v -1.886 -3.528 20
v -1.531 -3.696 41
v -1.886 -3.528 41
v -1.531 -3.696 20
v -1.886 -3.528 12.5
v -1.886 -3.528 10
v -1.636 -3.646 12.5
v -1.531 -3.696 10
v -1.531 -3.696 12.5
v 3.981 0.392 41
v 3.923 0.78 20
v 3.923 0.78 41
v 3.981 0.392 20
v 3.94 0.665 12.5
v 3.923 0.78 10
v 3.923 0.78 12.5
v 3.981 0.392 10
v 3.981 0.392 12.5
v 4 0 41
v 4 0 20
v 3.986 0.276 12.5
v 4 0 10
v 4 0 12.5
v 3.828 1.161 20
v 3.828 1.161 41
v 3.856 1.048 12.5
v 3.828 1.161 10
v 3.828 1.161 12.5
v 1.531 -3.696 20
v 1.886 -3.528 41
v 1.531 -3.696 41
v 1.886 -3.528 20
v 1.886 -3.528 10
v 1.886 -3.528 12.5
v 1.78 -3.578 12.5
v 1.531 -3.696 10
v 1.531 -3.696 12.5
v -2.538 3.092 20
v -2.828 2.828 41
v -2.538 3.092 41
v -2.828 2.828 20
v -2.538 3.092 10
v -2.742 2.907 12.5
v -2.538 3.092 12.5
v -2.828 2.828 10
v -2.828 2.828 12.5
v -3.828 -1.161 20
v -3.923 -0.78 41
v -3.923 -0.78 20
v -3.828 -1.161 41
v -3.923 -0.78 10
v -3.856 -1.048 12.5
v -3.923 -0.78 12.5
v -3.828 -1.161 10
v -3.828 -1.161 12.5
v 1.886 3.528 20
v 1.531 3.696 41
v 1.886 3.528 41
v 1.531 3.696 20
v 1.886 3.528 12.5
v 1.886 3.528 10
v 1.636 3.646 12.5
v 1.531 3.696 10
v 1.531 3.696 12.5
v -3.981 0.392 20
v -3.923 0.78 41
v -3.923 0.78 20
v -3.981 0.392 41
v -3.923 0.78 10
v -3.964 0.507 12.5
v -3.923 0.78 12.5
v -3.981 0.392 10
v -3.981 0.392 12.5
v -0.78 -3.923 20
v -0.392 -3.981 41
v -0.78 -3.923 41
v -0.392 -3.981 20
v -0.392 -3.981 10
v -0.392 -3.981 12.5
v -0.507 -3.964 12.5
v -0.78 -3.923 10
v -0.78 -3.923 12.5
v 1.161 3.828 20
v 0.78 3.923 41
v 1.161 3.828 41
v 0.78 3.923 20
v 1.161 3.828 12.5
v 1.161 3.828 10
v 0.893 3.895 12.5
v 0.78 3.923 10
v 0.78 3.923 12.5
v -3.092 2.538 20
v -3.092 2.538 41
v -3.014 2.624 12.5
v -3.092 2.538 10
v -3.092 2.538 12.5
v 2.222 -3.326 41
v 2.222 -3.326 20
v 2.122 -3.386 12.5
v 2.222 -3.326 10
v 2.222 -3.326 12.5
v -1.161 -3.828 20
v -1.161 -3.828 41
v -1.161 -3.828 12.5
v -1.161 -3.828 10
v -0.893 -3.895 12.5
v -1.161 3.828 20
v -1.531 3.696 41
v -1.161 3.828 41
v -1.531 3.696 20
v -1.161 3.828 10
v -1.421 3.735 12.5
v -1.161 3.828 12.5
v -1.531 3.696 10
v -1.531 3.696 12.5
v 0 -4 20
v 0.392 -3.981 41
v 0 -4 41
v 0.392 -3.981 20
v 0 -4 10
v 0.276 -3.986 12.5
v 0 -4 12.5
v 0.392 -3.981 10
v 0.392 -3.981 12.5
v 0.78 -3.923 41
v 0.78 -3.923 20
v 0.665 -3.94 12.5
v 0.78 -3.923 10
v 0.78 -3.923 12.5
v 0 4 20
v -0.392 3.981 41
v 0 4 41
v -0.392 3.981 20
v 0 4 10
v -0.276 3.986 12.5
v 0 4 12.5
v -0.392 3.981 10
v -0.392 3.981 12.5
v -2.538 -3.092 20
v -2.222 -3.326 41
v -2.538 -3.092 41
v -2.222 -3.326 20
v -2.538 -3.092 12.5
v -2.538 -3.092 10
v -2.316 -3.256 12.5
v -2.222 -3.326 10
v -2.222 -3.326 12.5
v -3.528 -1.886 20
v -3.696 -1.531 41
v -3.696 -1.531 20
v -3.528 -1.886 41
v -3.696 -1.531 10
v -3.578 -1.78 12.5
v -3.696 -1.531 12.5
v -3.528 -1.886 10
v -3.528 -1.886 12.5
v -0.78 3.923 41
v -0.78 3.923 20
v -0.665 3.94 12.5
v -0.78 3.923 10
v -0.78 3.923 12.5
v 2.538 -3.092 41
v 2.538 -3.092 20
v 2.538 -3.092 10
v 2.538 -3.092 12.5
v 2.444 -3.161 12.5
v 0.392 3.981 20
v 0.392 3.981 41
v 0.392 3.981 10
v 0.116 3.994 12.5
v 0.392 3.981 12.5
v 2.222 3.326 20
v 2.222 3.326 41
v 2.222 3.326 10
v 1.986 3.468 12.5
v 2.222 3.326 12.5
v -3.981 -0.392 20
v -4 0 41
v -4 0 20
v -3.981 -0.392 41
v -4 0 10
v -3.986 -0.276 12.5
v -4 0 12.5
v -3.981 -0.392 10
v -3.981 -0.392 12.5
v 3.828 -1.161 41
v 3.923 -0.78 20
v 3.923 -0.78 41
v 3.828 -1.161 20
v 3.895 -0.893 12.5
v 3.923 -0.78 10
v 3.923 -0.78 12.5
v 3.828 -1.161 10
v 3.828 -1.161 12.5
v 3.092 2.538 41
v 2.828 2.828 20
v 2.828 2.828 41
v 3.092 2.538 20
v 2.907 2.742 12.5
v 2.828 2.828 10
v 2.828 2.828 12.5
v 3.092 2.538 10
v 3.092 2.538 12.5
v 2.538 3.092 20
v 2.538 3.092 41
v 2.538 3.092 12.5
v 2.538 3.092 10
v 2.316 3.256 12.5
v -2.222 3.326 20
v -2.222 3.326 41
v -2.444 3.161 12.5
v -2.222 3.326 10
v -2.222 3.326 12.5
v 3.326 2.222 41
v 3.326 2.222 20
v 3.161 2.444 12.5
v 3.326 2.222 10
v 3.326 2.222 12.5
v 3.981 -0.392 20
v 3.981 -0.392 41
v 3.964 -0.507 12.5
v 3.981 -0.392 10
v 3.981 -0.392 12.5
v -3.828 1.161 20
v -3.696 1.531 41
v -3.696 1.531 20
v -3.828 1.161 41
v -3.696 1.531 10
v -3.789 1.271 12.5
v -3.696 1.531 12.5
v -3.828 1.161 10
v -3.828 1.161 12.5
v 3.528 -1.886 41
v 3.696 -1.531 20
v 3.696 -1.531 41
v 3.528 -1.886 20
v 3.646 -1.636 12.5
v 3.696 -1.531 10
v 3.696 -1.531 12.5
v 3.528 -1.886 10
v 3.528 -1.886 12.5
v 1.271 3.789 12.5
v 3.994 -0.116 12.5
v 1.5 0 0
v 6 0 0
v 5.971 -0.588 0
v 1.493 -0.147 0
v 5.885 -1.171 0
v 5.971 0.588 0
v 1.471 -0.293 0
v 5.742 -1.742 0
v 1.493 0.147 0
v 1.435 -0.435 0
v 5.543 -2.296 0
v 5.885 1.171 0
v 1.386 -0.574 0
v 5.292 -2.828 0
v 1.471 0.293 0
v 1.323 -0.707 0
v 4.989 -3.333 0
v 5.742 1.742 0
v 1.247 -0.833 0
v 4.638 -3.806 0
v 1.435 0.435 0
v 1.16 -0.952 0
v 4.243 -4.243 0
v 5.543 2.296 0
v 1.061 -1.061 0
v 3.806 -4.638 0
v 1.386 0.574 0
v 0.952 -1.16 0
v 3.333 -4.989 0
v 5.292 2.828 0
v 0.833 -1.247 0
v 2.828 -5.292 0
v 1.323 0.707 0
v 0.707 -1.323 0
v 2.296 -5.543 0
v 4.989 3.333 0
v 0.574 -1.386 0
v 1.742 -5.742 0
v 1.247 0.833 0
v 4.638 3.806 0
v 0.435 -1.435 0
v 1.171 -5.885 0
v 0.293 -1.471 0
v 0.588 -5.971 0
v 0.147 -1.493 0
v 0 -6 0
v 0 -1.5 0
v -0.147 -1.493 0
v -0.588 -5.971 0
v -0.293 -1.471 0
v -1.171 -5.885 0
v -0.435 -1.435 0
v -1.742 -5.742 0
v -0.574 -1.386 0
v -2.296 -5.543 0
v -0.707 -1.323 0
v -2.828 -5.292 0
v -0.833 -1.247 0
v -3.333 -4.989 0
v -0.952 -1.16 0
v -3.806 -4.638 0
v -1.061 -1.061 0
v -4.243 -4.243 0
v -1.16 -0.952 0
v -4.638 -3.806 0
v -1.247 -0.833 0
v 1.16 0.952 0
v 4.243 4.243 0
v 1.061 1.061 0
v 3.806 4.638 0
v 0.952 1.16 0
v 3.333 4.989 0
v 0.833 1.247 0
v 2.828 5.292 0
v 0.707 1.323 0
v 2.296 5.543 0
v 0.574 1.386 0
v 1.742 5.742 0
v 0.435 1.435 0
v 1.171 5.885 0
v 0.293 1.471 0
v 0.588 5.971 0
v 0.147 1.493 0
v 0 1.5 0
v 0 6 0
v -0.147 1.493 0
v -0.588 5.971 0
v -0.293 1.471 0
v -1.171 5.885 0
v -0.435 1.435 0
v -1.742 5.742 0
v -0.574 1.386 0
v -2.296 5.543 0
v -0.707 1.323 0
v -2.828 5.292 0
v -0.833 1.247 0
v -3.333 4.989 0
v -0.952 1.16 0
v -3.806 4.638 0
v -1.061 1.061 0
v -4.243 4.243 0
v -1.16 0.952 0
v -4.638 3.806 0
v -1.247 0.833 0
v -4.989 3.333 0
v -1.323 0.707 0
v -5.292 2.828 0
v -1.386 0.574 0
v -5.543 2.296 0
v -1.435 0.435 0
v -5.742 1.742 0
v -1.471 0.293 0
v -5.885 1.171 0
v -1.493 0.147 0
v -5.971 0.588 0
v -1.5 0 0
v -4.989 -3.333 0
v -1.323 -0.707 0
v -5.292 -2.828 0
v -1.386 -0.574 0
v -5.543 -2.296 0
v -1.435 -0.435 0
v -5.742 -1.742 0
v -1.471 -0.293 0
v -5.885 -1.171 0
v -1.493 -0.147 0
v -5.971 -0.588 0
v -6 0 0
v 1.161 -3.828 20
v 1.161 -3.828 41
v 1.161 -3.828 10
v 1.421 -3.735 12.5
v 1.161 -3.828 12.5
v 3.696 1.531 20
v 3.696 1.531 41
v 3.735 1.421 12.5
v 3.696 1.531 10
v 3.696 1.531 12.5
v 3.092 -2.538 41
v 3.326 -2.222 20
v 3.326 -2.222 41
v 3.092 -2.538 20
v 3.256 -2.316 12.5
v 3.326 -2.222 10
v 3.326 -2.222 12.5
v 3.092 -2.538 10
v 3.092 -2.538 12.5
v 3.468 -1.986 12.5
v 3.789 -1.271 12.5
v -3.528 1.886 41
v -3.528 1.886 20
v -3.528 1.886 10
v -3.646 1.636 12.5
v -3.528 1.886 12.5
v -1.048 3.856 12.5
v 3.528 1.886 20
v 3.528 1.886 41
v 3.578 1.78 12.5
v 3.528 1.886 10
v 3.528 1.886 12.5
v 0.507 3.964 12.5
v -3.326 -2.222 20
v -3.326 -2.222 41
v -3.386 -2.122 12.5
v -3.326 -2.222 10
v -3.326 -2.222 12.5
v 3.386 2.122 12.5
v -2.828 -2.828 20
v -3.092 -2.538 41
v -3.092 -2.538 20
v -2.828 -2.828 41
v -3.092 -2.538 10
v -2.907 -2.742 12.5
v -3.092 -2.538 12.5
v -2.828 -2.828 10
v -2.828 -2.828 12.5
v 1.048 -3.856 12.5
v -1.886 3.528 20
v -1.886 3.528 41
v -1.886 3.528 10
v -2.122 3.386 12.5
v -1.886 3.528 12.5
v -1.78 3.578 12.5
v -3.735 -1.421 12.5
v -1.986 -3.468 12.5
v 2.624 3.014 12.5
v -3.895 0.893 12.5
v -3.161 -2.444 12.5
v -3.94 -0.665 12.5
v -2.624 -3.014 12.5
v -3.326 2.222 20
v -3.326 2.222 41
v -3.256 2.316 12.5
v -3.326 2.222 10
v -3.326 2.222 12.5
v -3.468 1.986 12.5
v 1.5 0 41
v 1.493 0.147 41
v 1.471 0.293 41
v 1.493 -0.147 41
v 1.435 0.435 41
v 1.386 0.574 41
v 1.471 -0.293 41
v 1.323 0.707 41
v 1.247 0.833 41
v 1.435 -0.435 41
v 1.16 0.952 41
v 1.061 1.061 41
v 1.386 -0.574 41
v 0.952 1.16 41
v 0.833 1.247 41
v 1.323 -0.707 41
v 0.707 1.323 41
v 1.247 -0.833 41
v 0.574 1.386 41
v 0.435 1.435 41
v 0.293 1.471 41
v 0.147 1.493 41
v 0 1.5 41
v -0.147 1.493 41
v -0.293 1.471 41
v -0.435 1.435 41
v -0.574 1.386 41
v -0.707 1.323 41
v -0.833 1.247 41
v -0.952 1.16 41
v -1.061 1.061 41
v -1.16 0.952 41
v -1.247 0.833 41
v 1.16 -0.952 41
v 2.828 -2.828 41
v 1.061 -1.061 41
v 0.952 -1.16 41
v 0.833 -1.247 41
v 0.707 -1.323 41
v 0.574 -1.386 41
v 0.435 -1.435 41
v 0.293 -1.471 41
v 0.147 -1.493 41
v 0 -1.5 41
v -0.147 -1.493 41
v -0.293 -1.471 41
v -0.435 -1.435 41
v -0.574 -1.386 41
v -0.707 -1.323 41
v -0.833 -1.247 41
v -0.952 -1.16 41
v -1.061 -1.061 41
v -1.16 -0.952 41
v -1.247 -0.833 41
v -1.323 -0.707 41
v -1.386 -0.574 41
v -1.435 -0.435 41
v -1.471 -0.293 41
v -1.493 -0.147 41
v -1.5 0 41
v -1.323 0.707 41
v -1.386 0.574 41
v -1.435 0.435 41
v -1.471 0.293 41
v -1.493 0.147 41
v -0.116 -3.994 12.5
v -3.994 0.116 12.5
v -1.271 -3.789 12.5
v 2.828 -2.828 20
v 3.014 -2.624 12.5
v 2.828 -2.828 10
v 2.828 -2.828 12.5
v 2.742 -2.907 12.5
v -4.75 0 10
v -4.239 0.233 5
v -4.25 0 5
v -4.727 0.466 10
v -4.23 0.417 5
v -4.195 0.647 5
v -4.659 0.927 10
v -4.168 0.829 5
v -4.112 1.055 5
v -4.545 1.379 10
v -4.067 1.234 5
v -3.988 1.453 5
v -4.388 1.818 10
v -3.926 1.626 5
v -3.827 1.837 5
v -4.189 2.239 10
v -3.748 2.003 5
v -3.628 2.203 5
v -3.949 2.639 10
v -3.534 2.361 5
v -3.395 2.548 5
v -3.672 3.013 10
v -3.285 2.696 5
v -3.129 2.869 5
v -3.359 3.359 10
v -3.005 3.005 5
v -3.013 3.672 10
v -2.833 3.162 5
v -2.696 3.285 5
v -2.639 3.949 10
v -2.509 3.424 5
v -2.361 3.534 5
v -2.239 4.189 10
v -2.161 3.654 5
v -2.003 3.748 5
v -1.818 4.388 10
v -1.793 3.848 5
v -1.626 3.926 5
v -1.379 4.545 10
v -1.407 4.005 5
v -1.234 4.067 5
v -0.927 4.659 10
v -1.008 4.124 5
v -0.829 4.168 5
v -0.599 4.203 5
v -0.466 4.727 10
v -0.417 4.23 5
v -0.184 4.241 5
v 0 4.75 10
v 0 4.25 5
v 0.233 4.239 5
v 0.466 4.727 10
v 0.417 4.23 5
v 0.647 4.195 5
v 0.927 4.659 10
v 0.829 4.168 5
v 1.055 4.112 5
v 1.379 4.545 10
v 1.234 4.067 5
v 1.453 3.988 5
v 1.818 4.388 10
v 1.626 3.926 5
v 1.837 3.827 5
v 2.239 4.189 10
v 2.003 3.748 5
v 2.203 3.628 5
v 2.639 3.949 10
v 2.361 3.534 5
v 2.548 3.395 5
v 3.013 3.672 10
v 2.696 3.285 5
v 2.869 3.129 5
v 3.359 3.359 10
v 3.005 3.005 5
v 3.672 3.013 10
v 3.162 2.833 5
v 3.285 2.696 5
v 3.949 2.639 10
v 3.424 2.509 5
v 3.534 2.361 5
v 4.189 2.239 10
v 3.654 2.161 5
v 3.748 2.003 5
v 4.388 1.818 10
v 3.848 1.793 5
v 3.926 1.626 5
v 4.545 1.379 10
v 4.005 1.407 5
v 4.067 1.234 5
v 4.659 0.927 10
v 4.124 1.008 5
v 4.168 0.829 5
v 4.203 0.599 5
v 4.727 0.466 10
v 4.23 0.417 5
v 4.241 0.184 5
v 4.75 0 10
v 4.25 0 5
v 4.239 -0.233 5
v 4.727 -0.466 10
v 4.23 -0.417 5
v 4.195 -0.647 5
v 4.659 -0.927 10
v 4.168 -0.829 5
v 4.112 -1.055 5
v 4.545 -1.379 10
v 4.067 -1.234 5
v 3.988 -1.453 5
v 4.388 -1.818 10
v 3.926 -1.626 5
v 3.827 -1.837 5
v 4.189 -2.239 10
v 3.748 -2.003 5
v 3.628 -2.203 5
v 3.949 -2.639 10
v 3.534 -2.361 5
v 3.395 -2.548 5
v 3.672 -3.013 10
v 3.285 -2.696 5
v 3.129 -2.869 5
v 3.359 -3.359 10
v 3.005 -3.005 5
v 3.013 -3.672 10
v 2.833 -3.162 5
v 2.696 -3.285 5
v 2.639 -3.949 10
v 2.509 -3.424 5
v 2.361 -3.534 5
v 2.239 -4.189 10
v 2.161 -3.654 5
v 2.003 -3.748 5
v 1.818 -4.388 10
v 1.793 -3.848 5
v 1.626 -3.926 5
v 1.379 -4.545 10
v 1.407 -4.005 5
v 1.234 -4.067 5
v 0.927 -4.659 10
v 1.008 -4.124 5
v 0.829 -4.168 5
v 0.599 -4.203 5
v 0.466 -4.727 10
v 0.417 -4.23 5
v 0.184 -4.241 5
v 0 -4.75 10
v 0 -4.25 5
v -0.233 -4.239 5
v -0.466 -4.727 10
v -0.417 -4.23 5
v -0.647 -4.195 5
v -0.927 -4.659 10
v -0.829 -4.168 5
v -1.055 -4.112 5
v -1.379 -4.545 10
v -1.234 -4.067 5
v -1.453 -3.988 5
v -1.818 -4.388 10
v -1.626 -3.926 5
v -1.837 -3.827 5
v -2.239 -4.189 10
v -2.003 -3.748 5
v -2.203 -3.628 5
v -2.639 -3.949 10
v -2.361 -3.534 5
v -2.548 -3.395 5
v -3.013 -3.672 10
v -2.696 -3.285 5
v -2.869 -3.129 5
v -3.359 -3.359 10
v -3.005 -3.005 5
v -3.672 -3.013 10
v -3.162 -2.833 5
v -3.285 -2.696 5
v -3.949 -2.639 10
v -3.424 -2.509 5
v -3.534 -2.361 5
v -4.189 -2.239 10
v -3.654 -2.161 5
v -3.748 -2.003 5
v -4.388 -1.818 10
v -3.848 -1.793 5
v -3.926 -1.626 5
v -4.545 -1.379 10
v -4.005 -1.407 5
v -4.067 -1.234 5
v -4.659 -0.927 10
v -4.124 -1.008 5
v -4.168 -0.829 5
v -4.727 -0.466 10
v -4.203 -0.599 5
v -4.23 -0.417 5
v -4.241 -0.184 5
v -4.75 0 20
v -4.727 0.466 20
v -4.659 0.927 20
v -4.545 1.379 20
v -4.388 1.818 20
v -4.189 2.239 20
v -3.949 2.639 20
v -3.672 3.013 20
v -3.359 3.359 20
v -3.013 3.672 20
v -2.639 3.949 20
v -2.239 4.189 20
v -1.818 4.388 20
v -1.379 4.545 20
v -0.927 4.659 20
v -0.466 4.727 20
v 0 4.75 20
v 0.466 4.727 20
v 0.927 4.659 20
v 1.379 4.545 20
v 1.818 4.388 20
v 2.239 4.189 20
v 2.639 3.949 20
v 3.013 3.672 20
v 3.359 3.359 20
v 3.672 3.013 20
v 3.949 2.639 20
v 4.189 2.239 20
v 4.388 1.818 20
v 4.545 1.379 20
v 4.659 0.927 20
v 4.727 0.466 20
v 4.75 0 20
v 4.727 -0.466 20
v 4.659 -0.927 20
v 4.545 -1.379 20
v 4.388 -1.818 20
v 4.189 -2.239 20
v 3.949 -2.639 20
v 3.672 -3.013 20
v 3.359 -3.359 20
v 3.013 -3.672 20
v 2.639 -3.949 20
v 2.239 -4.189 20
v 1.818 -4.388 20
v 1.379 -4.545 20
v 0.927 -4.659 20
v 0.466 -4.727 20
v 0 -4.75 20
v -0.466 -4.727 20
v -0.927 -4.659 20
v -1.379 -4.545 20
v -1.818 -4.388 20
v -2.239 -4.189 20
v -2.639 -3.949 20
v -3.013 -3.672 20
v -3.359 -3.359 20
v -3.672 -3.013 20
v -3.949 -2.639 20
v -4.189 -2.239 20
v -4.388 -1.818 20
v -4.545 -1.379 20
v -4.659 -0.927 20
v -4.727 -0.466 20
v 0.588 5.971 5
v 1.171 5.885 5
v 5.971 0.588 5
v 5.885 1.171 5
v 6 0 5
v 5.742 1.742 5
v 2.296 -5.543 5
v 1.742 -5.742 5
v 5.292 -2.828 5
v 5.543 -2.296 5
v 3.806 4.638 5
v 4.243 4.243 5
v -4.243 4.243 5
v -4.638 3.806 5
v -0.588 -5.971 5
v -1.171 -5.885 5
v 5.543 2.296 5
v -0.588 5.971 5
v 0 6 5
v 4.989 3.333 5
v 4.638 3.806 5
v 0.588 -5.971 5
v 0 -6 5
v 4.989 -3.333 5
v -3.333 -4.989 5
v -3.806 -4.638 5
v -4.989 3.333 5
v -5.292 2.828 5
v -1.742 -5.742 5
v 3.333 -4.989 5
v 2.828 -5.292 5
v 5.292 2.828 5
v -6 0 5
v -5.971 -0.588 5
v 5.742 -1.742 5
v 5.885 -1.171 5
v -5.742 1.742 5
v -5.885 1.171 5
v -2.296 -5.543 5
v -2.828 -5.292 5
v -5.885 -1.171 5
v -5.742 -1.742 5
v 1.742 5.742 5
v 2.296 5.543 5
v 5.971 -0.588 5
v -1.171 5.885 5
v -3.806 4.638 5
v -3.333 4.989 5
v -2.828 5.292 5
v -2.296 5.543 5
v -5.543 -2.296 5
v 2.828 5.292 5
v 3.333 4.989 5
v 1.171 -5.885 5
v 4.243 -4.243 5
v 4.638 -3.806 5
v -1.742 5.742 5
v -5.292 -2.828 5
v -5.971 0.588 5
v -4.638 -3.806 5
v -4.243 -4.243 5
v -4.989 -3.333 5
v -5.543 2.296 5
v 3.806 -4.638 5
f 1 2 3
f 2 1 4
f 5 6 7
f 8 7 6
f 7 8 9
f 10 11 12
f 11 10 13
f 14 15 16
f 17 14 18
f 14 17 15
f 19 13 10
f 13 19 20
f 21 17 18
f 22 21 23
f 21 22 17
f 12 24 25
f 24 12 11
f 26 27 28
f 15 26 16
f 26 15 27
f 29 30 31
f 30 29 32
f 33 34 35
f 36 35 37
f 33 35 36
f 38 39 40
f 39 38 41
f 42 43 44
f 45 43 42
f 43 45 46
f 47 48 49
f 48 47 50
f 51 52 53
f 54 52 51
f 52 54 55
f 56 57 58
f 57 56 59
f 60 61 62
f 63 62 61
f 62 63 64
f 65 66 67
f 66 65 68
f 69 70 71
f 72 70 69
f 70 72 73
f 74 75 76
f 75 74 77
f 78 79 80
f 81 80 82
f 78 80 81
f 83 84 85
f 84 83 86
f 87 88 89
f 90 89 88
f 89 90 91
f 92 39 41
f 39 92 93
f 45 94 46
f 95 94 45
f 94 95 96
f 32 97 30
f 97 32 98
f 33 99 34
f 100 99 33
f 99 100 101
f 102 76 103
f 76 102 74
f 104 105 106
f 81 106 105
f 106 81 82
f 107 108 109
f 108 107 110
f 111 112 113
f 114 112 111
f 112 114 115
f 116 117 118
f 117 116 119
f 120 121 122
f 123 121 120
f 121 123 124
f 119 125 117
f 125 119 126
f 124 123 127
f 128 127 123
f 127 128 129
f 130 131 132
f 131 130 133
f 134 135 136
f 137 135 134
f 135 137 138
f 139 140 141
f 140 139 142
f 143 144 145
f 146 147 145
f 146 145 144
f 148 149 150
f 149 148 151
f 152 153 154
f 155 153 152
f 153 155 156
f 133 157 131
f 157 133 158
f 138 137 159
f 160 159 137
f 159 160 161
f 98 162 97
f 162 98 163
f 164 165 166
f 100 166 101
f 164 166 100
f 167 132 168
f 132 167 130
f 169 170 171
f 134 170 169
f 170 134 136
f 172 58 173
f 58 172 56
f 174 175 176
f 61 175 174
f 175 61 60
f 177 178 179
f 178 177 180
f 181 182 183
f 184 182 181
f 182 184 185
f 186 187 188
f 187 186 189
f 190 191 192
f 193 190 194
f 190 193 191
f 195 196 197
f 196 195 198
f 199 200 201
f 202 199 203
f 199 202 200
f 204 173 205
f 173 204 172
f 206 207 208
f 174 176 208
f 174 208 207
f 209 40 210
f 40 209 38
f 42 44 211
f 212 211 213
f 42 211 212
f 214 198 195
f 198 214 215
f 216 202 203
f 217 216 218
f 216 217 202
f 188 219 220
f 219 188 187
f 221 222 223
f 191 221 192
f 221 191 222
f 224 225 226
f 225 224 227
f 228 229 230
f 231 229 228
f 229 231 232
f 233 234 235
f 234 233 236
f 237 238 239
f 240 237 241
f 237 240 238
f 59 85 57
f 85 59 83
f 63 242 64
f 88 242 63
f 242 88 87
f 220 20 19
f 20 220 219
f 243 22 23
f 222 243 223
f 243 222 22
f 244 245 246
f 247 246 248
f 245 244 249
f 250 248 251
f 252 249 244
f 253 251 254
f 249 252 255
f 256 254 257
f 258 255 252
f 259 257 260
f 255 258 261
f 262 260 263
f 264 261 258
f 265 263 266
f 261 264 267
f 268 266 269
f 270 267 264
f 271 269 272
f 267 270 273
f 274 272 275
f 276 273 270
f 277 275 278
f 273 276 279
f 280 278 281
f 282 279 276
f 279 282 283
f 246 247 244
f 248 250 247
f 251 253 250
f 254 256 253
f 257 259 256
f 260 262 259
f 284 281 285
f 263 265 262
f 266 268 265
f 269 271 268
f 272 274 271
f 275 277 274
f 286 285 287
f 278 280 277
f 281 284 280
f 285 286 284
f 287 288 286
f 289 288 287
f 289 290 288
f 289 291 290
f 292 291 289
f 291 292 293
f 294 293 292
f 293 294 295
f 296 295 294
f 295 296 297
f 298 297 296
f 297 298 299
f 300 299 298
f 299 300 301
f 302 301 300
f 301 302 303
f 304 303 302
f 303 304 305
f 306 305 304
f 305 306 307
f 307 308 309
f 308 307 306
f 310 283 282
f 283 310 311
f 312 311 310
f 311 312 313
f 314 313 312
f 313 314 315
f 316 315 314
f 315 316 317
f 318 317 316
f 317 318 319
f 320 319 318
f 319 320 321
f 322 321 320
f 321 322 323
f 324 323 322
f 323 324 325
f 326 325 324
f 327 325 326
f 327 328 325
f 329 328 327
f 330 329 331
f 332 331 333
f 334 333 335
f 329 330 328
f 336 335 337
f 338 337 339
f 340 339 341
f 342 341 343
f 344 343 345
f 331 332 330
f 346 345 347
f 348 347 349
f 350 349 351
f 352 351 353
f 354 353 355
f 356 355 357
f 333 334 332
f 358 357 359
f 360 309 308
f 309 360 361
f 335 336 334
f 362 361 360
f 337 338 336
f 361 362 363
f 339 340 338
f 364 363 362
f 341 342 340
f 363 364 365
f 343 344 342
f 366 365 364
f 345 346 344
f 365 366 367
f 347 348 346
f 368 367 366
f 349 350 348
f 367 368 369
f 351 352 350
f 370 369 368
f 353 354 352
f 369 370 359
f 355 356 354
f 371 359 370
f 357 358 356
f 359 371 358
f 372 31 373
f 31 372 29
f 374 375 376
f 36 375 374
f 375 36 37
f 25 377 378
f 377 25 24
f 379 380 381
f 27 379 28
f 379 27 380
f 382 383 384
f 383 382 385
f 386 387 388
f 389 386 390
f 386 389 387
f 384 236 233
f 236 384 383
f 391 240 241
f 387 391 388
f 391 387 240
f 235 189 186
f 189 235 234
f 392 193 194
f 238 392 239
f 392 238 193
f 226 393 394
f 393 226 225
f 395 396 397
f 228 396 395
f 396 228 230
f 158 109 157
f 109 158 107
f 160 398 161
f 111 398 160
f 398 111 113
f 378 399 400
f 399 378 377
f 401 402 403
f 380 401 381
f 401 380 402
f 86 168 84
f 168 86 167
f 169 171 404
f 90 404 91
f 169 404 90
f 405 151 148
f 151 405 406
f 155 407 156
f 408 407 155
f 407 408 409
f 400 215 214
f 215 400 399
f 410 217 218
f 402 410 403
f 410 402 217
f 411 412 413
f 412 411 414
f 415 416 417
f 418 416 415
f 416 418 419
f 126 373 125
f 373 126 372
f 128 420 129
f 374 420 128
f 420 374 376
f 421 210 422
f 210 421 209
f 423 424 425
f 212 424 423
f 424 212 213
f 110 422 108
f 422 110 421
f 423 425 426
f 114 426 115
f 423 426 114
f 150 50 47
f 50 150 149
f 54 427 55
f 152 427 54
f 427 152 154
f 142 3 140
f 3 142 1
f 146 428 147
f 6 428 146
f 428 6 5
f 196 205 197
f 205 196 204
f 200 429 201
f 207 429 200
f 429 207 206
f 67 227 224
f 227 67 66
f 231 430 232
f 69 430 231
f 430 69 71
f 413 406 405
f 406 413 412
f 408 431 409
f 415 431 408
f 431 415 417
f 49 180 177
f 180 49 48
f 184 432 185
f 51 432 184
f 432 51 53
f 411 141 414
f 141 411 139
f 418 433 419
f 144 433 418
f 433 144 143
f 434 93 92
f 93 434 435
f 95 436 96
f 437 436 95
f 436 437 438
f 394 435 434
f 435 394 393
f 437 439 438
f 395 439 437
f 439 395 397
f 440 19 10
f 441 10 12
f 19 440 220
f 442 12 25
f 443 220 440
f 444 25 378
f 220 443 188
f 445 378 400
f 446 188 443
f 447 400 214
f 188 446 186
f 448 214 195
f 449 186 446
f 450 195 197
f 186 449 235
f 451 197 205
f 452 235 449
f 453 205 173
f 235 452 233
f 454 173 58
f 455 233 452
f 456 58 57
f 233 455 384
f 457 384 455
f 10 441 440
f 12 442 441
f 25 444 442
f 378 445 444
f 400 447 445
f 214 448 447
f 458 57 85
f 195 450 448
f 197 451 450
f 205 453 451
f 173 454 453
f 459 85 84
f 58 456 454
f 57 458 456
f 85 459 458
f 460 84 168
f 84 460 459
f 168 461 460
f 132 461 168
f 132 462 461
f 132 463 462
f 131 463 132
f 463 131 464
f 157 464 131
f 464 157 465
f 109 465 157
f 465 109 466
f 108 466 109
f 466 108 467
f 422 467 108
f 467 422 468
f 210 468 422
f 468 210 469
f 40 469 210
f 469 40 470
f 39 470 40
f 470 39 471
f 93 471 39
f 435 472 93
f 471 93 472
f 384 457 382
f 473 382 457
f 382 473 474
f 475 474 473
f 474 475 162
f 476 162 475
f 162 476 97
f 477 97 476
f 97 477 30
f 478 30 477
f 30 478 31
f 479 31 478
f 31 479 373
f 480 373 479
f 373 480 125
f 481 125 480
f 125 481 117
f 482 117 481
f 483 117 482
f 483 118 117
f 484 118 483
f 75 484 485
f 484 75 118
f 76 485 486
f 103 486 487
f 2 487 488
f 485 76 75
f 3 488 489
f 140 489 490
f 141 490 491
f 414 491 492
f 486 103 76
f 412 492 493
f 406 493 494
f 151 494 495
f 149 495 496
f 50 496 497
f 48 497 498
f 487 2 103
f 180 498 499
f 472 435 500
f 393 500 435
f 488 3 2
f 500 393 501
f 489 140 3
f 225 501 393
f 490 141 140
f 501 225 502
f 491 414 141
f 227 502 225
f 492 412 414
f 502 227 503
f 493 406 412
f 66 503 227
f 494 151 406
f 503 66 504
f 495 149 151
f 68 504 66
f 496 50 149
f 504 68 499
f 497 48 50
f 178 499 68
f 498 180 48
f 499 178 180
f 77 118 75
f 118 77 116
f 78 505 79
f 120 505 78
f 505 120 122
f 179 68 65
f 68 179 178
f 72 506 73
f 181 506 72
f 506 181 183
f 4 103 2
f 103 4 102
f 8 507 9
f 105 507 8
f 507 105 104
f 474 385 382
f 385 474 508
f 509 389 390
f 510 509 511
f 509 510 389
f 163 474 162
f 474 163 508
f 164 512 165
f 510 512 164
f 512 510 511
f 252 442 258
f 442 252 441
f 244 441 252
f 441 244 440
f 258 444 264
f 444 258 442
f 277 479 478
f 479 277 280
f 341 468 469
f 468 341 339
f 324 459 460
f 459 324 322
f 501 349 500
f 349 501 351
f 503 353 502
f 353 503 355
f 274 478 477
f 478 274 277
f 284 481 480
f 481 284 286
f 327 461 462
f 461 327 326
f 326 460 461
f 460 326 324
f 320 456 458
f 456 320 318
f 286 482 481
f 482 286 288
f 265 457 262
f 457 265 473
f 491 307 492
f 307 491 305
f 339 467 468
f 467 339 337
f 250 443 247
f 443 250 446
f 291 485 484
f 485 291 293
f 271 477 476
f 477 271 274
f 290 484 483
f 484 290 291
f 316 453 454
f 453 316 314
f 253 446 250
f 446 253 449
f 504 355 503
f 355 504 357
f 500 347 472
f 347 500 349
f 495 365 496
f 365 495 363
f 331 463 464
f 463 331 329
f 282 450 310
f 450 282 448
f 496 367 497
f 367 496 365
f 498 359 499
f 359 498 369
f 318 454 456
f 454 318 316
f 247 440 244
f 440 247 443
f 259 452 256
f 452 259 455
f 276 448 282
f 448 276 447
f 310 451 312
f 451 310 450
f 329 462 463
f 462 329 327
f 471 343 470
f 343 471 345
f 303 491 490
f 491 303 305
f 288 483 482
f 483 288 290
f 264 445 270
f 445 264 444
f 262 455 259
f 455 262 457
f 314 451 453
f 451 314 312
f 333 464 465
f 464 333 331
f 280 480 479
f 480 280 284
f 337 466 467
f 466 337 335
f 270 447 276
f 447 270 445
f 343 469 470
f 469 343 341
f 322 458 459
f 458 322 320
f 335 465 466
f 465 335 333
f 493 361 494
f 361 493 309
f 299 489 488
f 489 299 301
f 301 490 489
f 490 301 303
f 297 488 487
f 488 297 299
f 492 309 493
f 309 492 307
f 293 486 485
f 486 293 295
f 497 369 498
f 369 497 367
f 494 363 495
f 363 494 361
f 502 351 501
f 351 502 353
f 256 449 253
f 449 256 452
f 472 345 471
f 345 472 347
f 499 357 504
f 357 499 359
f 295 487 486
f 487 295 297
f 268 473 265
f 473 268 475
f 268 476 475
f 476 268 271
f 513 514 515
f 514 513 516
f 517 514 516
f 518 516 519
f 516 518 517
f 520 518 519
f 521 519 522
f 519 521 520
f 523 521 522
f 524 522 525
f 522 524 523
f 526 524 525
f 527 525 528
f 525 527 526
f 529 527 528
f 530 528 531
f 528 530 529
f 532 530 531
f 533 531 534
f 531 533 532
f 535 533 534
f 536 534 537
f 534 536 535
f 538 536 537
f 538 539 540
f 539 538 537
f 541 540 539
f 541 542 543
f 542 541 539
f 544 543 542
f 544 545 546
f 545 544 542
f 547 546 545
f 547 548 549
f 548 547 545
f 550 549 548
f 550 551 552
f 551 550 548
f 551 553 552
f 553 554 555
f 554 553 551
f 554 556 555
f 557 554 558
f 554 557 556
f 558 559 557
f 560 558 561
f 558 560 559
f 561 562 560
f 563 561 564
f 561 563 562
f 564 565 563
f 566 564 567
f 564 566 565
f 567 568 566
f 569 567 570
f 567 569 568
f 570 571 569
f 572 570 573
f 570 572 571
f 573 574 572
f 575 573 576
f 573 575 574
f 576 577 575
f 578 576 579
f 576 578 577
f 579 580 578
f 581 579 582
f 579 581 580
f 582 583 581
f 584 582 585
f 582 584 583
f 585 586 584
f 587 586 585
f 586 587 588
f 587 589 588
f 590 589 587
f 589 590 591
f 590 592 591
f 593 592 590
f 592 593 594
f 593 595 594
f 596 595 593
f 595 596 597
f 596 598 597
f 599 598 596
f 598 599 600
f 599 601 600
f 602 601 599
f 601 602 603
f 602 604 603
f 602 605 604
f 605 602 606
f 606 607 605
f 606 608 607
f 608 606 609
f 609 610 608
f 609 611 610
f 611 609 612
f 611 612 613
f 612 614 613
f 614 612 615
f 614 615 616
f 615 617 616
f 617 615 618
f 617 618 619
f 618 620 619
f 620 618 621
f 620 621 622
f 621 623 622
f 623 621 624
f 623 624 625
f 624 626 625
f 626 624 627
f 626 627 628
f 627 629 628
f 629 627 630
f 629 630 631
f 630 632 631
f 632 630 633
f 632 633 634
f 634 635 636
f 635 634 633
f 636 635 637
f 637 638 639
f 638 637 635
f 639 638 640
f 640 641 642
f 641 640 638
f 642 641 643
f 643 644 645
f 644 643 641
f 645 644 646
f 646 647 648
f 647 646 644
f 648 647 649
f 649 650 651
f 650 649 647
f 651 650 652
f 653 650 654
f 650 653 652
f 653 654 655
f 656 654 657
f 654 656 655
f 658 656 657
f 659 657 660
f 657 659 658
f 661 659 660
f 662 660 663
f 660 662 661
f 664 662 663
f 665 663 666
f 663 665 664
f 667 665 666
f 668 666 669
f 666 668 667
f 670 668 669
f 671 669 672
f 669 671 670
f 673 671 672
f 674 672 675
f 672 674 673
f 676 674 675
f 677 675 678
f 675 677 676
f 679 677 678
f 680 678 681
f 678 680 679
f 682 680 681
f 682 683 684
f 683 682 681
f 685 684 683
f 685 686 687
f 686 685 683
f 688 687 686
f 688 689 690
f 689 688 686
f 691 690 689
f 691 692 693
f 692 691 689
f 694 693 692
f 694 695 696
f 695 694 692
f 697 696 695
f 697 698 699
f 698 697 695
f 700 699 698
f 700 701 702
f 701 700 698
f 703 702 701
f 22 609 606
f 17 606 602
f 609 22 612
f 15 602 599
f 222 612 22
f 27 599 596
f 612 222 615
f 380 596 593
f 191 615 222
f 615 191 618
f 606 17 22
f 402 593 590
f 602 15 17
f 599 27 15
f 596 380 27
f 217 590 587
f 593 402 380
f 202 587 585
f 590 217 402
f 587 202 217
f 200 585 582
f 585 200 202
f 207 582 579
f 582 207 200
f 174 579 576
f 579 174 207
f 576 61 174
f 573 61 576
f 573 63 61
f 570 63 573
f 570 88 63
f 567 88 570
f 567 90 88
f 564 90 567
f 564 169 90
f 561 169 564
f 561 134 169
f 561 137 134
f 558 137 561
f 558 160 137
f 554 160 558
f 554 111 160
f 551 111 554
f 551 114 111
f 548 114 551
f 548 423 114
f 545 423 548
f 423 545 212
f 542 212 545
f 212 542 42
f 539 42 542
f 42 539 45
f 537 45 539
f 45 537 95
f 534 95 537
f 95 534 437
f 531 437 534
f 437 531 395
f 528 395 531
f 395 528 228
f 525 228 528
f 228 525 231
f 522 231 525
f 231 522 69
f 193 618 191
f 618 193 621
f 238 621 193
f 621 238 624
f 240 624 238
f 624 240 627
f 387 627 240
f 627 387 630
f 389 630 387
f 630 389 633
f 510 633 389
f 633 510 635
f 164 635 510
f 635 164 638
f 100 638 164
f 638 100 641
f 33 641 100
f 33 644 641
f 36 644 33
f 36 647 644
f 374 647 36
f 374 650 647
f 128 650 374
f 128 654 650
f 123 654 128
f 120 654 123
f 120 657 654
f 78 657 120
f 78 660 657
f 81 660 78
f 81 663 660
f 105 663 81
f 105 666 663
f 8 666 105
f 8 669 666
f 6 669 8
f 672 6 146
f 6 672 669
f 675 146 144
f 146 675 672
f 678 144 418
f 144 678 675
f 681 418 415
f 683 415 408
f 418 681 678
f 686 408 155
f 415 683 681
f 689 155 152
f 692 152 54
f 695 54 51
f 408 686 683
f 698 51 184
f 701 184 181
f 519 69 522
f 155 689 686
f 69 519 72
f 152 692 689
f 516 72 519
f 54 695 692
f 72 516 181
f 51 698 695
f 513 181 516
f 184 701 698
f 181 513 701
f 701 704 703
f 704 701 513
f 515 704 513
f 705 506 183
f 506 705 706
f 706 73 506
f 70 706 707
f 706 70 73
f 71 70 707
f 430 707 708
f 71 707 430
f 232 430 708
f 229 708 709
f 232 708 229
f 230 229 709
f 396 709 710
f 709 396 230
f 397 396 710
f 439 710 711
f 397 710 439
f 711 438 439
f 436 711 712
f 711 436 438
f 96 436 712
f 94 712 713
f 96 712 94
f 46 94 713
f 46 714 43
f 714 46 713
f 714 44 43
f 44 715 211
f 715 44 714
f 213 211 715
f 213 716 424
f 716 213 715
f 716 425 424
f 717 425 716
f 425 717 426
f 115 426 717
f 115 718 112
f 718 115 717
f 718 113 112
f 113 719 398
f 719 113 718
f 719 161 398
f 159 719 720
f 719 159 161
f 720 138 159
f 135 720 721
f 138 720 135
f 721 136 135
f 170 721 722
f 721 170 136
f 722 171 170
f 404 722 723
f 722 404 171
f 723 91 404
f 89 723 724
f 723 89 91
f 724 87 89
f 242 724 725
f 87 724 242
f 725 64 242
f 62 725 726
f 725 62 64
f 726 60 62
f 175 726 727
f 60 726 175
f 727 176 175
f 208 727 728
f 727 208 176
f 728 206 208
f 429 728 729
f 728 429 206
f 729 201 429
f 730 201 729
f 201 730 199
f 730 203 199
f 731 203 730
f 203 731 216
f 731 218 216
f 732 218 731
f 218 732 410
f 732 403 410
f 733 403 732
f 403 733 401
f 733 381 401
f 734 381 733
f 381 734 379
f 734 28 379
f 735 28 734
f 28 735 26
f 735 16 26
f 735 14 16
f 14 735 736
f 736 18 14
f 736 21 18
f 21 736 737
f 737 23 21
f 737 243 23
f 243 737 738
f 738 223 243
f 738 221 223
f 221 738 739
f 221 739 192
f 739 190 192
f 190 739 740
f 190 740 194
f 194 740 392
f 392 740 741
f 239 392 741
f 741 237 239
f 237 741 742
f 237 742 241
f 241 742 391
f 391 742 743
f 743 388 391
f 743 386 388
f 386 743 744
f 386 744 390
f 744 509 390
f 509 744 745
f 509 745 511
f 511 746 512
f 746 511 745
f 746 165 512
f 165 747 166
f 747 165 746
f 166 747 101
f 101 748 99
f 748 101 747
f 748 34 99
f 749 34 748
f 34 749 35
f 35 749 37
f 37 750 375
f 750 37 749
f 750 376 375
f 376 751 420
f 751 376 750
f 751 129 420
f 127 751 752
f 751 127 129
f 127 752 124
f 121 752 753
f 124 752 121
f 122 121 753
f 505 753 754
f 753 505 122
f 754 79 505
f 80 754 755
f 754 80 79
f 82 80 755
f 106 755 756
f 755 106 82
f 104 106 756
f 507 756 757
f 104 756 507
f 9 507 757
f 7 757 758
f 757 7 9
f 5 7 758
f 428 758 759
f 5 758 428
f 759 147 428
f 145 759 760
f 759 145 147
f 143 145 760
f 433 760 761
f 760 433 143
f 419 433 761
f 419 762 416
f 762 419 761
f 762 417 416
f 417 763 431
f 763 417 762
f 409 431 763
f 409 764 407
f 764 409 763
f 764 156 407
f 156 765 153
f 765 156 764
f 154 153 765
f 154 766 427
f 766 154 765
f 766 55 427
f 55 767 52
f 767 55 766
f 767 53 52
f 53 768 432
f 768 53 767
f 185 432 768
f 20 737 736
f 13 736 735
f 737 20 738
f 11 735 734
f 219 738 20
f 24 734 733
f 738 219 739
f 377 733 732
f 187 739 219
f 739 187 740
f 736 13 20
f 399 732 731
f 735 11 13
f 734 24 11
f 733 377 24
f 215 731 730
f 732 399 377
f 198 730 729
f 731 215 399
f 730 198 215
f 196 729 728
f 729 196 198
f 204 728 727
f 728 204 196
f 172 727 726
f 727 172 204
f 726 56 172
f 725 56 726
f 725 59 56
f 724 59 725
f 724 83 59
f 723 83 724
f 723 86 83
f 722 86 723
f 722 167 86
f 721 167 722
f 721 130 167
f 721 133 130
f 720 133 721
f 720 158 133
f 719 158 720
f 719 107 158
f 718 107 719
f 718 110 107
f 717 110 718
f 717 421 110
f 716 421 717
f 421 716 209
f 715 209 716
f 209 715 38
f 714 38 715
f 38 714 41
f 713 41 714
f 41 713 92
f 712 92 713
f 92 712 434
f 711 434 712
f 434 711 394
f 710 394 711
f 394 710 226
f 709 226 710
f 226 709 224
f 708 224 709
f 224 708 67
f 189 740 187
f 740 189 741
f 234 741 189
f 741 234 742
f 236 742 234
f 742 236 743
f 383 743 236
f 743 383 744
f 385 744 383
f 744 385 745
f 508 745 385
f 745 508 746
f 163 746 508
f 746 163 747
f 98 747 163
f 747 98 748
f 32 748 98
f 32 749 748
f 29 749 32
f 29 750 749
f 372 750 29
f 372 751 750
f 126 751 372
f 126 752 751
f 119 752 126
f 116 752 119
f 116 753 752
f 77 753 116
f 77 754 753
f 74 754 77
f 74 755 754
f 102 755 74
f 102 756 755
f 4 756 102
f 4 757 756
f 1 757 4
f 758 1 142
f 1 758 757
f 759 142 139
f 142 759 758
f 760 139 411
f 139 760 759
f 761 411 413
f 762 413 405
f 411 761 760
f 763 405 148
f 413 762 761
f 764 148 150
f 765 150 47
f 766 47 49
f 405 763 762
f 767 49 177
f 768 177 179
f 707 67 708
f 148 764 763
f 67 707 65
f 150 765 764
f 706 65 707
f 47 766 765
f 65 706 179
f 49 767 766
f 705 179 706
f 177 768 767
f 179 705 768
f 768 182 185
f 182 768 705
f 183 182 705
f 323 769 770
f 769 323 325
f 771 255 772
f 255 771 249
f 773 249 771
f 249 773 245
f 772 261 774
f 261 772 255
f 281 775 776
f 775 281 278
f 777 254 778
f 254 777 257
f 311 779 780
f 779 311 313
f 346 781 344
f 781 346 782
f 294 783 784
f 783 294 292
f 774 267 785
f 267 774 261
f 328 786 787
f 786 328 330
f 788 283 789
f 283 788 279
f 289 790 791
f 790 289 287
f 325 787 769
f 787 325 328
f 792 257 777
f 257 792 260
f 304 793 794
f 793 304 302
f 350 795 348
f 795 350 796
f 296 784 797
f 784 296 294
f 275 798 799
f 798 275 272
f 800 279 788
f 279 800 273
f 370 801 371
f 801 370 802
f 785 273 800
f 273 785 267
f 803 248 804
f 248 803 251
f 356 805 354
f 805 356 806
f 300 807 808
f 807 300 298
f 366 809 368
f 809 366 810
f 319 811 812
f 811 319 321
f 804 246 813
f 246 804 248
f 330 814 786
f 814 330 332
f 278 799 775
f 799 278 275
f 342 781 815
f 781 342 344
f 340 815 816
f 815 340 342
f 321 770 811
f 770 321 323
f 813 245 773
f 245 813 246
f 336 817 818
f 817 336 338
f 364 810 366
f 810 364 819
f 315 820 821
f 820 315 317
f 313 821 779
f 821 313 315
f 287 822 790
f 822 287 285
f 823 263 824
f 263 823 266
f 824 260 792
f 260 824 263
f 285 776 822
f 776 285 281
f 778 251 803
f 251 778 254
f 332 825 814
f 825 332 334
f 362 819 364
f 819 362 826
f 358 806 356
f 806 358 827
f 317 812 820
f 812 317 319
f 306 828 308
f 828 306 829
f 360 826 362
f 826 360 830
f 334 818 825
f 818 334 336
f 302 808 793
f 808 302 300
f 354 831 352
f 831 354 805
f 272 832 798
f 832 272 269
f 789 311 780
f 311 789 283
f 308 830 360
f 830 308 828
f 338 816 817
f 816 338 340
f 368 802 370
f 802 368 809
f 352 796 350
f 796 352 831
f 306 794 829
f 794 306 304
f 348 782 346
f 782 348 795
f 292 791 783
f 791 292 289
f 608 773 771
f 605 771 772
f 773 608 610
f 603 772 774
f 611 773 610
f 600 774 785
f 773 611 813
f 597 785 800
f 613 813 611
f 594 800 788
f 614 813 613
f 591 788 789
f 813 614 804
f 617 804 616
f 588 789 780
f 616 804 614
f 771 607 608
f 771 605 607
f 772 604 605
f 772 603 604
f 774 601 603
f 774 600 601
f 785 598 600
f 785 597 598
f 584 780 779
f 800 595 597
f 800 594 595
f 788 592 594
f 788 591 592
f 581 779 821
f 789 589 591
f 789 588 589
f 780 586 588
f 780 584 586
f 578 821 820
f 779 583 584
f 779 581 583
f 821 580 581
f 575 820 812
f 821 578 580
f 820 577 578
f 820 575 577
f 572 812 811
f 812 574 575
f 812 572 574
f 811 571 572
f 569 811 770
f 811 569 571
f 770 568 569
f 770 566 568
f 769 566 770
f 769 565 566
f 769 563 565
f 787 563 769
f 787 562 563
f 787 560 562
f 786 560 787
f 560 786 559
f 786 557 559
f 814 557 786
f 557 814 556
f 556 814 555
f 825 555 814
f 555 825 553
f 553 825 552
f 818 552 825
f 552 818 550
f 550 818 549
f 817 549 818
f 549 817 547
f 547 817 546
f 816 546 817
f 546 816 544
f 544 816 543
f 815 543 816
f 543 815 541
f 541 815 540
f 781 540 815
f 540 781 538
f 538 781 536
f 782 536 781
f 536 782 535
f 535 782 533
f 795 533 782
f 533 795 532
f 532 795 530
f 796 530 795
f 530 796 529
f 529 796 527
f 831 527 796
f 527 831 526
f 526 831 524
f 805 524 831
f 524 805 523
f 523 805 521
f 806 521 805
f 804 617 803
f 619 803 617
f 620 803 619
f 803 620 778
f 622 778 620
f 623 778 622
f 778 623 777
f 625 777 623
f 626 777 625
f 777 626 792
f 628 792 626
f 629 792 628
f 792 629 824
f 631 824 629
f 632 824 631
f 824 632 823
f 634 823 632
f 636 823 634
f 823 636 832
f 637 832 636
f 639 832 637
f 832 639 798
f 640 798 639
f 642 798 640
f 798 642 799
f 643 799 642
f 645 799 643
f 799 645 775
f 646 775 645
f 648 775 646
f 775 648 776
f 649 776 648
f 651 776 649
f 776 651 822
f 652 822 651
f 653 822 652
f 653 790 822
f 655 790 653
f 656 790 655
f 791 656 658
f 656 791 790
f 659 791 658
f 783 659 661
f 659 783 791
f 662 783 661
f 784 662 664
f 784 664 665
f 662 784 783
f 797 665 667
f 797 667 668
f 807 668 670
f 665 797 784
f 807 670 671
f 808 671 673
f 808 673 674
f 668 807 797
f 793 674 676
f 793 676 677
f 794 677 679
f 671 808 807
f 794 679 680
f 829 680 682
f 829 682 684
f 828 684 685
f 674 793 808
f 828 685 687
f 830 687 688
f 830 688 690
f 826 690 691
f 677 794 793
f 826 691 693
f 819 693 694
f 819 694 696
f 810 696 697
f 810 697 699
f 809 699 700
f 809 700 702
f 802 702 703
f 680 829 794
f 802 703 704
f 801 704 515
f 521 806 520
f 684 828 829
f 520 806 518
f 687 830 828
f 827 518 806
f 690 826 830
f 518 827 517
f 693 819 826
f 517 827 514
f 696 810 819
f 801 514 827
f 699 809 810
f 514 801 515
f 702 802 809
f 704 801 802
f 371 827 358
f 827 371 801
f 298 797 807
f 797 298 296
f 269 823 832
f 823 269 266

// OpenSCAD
// Dimensions for the hose-barb reducer
$fn = 64;

// Overall dimensions
hose_8mm_id = 8;        // Inner diameter of 8 mm tubing
hose_5mm_id = 5;      // Inner diameter of 5 mm tubing
bore_diameter = 3;     // 3 mm bore through the center
z0 = 0;                  // Start of 8 mm barb section
z1 = 20;                 // End of 8 mm barb section
z2 = 25;                 // End of collar section
z3 = 41;                 // End of 5 mm barb section

// 8 mm barb section: 2 barbs, each 10 mm tall, stacked from z=0 to z=20
barb_8mm_height = 10;    // Height of each individual barb
barb_8mm_bottom_d = 7.5;  // Outer diameter at bottom of 8 mm barb
barb_8mm_top_d = 9.5;      // Outer diameter at top of 8 mm barb
barb_8mm_step_back = 7.5;  // Return to this diameter after the peak

// Collar section: 12 mm diameter, 5 mm long (z=20 to z=25)
collar_diameter = 12;

// 5 mm barb section: 2 barbs, each 8 mm tall, stacked from z=25 to z=41
barb_5mm_height = 8;         // Height of each individual barb
barb_5mm_bottom_d = 6.5;    // Outer diameter at bottom of 5 mm barb
barb_5mm_top_d = 5.0;     // Outer diameter at top of 5 mm barb
barb_5mm_step_back = 6.5;    // Return to this diameter after the peak

// Build the reducer using union of parts
module hose_reducer() {
    // Start with a solid cylinder for the bore
    difference() {
        // Full length cylinder from z=0 to z=41
        cylinder(h = z3, r = hose_8mm_id / 2, center = false);
        
        // Subtract the bore (a cylinder of 3 mm diameter through the full length)
        cylinder(h = z3 + 1, r = bore_diameter / 2, center = false, $fn = 64);
    }

    // Add 8 mm barbs: two stacked barbs from z=0 to z=20
    for (i = [0:1]) {
        z_start = z0 + i * barb_8mm_height;
        z_end = z_start + barb_8mm_height;

        // Create a sawtooth profile: expand from bottom to top, then step back
        // We'll use a rotate_extrude of a polygon that defines the radial profile
        // The profile is: (r_bottom, z_start) -> (r_top, z_end) -> (r_bottom, z_end) -> (r_bottom, z_start)
        // This forms a sawtooth shape in the r-z plane

        // Define the 2D polygon for one barb's outer profile
        // Points: [r, z]
        poly_points = [
            [barb_8mm_bottom_d / 2, z_start],
            [barb_8mm_top_d / 2, z_end],
            [barb_8mm_bottom_d / 2, z_end],
            [barb_8mm_bottom_d / 2, z_start]
        ];

        // Create a rotate_extrude of the polygon to form the barb
        // The polygon is in the r-z plane, so rotate_extrude will make it a 3D shape
        rotate_extrude(convexity = 10)
        polygon(poly_points);
    }

    // Add collar section: from z=20 to z=25, 12 mm diameter
    difference() {
        // Cylinder for the collar
        cylinder(h = z2 - z1, r = collar_diameter / 2, center = false);
        
        // Subtract the bore through this section
        cylinder(h = z2 - z1 + 1, r = bore_diameter / 2, center = false, $fn = 64);
    }

    // Add 5 mm barbs: two stacked barbs from z=25 to z=41
    for (i = [0:1]) {
        z_start = z2 + i * barb_5mm_height;
        z_end = z_start + barb_5mm_height;

        // Create a sawtooth profile: shrink from bottom to top, then step back
        // The profile: (r_bottom, z_start) -> (r_top, z_end) -> (r_bottom, z_end) -> (r_bottom, z_start)
        poly_points = [
            [barb_5mm_bottom_d / 2, z_start],
            [barb_5mm_top_d / 2, z_end],
            [barb_5mm_bottom_d / 2, z_end],
            [barb_5mm_bottom_d / 2, z_start]
        ];

        // Create a rotate_extrude of the polygon to form the barb
        rotate_extrude(convexity = 10)
        polygon(poly_points);
    }
}

// Call the module to build the part
hose_reducer();
